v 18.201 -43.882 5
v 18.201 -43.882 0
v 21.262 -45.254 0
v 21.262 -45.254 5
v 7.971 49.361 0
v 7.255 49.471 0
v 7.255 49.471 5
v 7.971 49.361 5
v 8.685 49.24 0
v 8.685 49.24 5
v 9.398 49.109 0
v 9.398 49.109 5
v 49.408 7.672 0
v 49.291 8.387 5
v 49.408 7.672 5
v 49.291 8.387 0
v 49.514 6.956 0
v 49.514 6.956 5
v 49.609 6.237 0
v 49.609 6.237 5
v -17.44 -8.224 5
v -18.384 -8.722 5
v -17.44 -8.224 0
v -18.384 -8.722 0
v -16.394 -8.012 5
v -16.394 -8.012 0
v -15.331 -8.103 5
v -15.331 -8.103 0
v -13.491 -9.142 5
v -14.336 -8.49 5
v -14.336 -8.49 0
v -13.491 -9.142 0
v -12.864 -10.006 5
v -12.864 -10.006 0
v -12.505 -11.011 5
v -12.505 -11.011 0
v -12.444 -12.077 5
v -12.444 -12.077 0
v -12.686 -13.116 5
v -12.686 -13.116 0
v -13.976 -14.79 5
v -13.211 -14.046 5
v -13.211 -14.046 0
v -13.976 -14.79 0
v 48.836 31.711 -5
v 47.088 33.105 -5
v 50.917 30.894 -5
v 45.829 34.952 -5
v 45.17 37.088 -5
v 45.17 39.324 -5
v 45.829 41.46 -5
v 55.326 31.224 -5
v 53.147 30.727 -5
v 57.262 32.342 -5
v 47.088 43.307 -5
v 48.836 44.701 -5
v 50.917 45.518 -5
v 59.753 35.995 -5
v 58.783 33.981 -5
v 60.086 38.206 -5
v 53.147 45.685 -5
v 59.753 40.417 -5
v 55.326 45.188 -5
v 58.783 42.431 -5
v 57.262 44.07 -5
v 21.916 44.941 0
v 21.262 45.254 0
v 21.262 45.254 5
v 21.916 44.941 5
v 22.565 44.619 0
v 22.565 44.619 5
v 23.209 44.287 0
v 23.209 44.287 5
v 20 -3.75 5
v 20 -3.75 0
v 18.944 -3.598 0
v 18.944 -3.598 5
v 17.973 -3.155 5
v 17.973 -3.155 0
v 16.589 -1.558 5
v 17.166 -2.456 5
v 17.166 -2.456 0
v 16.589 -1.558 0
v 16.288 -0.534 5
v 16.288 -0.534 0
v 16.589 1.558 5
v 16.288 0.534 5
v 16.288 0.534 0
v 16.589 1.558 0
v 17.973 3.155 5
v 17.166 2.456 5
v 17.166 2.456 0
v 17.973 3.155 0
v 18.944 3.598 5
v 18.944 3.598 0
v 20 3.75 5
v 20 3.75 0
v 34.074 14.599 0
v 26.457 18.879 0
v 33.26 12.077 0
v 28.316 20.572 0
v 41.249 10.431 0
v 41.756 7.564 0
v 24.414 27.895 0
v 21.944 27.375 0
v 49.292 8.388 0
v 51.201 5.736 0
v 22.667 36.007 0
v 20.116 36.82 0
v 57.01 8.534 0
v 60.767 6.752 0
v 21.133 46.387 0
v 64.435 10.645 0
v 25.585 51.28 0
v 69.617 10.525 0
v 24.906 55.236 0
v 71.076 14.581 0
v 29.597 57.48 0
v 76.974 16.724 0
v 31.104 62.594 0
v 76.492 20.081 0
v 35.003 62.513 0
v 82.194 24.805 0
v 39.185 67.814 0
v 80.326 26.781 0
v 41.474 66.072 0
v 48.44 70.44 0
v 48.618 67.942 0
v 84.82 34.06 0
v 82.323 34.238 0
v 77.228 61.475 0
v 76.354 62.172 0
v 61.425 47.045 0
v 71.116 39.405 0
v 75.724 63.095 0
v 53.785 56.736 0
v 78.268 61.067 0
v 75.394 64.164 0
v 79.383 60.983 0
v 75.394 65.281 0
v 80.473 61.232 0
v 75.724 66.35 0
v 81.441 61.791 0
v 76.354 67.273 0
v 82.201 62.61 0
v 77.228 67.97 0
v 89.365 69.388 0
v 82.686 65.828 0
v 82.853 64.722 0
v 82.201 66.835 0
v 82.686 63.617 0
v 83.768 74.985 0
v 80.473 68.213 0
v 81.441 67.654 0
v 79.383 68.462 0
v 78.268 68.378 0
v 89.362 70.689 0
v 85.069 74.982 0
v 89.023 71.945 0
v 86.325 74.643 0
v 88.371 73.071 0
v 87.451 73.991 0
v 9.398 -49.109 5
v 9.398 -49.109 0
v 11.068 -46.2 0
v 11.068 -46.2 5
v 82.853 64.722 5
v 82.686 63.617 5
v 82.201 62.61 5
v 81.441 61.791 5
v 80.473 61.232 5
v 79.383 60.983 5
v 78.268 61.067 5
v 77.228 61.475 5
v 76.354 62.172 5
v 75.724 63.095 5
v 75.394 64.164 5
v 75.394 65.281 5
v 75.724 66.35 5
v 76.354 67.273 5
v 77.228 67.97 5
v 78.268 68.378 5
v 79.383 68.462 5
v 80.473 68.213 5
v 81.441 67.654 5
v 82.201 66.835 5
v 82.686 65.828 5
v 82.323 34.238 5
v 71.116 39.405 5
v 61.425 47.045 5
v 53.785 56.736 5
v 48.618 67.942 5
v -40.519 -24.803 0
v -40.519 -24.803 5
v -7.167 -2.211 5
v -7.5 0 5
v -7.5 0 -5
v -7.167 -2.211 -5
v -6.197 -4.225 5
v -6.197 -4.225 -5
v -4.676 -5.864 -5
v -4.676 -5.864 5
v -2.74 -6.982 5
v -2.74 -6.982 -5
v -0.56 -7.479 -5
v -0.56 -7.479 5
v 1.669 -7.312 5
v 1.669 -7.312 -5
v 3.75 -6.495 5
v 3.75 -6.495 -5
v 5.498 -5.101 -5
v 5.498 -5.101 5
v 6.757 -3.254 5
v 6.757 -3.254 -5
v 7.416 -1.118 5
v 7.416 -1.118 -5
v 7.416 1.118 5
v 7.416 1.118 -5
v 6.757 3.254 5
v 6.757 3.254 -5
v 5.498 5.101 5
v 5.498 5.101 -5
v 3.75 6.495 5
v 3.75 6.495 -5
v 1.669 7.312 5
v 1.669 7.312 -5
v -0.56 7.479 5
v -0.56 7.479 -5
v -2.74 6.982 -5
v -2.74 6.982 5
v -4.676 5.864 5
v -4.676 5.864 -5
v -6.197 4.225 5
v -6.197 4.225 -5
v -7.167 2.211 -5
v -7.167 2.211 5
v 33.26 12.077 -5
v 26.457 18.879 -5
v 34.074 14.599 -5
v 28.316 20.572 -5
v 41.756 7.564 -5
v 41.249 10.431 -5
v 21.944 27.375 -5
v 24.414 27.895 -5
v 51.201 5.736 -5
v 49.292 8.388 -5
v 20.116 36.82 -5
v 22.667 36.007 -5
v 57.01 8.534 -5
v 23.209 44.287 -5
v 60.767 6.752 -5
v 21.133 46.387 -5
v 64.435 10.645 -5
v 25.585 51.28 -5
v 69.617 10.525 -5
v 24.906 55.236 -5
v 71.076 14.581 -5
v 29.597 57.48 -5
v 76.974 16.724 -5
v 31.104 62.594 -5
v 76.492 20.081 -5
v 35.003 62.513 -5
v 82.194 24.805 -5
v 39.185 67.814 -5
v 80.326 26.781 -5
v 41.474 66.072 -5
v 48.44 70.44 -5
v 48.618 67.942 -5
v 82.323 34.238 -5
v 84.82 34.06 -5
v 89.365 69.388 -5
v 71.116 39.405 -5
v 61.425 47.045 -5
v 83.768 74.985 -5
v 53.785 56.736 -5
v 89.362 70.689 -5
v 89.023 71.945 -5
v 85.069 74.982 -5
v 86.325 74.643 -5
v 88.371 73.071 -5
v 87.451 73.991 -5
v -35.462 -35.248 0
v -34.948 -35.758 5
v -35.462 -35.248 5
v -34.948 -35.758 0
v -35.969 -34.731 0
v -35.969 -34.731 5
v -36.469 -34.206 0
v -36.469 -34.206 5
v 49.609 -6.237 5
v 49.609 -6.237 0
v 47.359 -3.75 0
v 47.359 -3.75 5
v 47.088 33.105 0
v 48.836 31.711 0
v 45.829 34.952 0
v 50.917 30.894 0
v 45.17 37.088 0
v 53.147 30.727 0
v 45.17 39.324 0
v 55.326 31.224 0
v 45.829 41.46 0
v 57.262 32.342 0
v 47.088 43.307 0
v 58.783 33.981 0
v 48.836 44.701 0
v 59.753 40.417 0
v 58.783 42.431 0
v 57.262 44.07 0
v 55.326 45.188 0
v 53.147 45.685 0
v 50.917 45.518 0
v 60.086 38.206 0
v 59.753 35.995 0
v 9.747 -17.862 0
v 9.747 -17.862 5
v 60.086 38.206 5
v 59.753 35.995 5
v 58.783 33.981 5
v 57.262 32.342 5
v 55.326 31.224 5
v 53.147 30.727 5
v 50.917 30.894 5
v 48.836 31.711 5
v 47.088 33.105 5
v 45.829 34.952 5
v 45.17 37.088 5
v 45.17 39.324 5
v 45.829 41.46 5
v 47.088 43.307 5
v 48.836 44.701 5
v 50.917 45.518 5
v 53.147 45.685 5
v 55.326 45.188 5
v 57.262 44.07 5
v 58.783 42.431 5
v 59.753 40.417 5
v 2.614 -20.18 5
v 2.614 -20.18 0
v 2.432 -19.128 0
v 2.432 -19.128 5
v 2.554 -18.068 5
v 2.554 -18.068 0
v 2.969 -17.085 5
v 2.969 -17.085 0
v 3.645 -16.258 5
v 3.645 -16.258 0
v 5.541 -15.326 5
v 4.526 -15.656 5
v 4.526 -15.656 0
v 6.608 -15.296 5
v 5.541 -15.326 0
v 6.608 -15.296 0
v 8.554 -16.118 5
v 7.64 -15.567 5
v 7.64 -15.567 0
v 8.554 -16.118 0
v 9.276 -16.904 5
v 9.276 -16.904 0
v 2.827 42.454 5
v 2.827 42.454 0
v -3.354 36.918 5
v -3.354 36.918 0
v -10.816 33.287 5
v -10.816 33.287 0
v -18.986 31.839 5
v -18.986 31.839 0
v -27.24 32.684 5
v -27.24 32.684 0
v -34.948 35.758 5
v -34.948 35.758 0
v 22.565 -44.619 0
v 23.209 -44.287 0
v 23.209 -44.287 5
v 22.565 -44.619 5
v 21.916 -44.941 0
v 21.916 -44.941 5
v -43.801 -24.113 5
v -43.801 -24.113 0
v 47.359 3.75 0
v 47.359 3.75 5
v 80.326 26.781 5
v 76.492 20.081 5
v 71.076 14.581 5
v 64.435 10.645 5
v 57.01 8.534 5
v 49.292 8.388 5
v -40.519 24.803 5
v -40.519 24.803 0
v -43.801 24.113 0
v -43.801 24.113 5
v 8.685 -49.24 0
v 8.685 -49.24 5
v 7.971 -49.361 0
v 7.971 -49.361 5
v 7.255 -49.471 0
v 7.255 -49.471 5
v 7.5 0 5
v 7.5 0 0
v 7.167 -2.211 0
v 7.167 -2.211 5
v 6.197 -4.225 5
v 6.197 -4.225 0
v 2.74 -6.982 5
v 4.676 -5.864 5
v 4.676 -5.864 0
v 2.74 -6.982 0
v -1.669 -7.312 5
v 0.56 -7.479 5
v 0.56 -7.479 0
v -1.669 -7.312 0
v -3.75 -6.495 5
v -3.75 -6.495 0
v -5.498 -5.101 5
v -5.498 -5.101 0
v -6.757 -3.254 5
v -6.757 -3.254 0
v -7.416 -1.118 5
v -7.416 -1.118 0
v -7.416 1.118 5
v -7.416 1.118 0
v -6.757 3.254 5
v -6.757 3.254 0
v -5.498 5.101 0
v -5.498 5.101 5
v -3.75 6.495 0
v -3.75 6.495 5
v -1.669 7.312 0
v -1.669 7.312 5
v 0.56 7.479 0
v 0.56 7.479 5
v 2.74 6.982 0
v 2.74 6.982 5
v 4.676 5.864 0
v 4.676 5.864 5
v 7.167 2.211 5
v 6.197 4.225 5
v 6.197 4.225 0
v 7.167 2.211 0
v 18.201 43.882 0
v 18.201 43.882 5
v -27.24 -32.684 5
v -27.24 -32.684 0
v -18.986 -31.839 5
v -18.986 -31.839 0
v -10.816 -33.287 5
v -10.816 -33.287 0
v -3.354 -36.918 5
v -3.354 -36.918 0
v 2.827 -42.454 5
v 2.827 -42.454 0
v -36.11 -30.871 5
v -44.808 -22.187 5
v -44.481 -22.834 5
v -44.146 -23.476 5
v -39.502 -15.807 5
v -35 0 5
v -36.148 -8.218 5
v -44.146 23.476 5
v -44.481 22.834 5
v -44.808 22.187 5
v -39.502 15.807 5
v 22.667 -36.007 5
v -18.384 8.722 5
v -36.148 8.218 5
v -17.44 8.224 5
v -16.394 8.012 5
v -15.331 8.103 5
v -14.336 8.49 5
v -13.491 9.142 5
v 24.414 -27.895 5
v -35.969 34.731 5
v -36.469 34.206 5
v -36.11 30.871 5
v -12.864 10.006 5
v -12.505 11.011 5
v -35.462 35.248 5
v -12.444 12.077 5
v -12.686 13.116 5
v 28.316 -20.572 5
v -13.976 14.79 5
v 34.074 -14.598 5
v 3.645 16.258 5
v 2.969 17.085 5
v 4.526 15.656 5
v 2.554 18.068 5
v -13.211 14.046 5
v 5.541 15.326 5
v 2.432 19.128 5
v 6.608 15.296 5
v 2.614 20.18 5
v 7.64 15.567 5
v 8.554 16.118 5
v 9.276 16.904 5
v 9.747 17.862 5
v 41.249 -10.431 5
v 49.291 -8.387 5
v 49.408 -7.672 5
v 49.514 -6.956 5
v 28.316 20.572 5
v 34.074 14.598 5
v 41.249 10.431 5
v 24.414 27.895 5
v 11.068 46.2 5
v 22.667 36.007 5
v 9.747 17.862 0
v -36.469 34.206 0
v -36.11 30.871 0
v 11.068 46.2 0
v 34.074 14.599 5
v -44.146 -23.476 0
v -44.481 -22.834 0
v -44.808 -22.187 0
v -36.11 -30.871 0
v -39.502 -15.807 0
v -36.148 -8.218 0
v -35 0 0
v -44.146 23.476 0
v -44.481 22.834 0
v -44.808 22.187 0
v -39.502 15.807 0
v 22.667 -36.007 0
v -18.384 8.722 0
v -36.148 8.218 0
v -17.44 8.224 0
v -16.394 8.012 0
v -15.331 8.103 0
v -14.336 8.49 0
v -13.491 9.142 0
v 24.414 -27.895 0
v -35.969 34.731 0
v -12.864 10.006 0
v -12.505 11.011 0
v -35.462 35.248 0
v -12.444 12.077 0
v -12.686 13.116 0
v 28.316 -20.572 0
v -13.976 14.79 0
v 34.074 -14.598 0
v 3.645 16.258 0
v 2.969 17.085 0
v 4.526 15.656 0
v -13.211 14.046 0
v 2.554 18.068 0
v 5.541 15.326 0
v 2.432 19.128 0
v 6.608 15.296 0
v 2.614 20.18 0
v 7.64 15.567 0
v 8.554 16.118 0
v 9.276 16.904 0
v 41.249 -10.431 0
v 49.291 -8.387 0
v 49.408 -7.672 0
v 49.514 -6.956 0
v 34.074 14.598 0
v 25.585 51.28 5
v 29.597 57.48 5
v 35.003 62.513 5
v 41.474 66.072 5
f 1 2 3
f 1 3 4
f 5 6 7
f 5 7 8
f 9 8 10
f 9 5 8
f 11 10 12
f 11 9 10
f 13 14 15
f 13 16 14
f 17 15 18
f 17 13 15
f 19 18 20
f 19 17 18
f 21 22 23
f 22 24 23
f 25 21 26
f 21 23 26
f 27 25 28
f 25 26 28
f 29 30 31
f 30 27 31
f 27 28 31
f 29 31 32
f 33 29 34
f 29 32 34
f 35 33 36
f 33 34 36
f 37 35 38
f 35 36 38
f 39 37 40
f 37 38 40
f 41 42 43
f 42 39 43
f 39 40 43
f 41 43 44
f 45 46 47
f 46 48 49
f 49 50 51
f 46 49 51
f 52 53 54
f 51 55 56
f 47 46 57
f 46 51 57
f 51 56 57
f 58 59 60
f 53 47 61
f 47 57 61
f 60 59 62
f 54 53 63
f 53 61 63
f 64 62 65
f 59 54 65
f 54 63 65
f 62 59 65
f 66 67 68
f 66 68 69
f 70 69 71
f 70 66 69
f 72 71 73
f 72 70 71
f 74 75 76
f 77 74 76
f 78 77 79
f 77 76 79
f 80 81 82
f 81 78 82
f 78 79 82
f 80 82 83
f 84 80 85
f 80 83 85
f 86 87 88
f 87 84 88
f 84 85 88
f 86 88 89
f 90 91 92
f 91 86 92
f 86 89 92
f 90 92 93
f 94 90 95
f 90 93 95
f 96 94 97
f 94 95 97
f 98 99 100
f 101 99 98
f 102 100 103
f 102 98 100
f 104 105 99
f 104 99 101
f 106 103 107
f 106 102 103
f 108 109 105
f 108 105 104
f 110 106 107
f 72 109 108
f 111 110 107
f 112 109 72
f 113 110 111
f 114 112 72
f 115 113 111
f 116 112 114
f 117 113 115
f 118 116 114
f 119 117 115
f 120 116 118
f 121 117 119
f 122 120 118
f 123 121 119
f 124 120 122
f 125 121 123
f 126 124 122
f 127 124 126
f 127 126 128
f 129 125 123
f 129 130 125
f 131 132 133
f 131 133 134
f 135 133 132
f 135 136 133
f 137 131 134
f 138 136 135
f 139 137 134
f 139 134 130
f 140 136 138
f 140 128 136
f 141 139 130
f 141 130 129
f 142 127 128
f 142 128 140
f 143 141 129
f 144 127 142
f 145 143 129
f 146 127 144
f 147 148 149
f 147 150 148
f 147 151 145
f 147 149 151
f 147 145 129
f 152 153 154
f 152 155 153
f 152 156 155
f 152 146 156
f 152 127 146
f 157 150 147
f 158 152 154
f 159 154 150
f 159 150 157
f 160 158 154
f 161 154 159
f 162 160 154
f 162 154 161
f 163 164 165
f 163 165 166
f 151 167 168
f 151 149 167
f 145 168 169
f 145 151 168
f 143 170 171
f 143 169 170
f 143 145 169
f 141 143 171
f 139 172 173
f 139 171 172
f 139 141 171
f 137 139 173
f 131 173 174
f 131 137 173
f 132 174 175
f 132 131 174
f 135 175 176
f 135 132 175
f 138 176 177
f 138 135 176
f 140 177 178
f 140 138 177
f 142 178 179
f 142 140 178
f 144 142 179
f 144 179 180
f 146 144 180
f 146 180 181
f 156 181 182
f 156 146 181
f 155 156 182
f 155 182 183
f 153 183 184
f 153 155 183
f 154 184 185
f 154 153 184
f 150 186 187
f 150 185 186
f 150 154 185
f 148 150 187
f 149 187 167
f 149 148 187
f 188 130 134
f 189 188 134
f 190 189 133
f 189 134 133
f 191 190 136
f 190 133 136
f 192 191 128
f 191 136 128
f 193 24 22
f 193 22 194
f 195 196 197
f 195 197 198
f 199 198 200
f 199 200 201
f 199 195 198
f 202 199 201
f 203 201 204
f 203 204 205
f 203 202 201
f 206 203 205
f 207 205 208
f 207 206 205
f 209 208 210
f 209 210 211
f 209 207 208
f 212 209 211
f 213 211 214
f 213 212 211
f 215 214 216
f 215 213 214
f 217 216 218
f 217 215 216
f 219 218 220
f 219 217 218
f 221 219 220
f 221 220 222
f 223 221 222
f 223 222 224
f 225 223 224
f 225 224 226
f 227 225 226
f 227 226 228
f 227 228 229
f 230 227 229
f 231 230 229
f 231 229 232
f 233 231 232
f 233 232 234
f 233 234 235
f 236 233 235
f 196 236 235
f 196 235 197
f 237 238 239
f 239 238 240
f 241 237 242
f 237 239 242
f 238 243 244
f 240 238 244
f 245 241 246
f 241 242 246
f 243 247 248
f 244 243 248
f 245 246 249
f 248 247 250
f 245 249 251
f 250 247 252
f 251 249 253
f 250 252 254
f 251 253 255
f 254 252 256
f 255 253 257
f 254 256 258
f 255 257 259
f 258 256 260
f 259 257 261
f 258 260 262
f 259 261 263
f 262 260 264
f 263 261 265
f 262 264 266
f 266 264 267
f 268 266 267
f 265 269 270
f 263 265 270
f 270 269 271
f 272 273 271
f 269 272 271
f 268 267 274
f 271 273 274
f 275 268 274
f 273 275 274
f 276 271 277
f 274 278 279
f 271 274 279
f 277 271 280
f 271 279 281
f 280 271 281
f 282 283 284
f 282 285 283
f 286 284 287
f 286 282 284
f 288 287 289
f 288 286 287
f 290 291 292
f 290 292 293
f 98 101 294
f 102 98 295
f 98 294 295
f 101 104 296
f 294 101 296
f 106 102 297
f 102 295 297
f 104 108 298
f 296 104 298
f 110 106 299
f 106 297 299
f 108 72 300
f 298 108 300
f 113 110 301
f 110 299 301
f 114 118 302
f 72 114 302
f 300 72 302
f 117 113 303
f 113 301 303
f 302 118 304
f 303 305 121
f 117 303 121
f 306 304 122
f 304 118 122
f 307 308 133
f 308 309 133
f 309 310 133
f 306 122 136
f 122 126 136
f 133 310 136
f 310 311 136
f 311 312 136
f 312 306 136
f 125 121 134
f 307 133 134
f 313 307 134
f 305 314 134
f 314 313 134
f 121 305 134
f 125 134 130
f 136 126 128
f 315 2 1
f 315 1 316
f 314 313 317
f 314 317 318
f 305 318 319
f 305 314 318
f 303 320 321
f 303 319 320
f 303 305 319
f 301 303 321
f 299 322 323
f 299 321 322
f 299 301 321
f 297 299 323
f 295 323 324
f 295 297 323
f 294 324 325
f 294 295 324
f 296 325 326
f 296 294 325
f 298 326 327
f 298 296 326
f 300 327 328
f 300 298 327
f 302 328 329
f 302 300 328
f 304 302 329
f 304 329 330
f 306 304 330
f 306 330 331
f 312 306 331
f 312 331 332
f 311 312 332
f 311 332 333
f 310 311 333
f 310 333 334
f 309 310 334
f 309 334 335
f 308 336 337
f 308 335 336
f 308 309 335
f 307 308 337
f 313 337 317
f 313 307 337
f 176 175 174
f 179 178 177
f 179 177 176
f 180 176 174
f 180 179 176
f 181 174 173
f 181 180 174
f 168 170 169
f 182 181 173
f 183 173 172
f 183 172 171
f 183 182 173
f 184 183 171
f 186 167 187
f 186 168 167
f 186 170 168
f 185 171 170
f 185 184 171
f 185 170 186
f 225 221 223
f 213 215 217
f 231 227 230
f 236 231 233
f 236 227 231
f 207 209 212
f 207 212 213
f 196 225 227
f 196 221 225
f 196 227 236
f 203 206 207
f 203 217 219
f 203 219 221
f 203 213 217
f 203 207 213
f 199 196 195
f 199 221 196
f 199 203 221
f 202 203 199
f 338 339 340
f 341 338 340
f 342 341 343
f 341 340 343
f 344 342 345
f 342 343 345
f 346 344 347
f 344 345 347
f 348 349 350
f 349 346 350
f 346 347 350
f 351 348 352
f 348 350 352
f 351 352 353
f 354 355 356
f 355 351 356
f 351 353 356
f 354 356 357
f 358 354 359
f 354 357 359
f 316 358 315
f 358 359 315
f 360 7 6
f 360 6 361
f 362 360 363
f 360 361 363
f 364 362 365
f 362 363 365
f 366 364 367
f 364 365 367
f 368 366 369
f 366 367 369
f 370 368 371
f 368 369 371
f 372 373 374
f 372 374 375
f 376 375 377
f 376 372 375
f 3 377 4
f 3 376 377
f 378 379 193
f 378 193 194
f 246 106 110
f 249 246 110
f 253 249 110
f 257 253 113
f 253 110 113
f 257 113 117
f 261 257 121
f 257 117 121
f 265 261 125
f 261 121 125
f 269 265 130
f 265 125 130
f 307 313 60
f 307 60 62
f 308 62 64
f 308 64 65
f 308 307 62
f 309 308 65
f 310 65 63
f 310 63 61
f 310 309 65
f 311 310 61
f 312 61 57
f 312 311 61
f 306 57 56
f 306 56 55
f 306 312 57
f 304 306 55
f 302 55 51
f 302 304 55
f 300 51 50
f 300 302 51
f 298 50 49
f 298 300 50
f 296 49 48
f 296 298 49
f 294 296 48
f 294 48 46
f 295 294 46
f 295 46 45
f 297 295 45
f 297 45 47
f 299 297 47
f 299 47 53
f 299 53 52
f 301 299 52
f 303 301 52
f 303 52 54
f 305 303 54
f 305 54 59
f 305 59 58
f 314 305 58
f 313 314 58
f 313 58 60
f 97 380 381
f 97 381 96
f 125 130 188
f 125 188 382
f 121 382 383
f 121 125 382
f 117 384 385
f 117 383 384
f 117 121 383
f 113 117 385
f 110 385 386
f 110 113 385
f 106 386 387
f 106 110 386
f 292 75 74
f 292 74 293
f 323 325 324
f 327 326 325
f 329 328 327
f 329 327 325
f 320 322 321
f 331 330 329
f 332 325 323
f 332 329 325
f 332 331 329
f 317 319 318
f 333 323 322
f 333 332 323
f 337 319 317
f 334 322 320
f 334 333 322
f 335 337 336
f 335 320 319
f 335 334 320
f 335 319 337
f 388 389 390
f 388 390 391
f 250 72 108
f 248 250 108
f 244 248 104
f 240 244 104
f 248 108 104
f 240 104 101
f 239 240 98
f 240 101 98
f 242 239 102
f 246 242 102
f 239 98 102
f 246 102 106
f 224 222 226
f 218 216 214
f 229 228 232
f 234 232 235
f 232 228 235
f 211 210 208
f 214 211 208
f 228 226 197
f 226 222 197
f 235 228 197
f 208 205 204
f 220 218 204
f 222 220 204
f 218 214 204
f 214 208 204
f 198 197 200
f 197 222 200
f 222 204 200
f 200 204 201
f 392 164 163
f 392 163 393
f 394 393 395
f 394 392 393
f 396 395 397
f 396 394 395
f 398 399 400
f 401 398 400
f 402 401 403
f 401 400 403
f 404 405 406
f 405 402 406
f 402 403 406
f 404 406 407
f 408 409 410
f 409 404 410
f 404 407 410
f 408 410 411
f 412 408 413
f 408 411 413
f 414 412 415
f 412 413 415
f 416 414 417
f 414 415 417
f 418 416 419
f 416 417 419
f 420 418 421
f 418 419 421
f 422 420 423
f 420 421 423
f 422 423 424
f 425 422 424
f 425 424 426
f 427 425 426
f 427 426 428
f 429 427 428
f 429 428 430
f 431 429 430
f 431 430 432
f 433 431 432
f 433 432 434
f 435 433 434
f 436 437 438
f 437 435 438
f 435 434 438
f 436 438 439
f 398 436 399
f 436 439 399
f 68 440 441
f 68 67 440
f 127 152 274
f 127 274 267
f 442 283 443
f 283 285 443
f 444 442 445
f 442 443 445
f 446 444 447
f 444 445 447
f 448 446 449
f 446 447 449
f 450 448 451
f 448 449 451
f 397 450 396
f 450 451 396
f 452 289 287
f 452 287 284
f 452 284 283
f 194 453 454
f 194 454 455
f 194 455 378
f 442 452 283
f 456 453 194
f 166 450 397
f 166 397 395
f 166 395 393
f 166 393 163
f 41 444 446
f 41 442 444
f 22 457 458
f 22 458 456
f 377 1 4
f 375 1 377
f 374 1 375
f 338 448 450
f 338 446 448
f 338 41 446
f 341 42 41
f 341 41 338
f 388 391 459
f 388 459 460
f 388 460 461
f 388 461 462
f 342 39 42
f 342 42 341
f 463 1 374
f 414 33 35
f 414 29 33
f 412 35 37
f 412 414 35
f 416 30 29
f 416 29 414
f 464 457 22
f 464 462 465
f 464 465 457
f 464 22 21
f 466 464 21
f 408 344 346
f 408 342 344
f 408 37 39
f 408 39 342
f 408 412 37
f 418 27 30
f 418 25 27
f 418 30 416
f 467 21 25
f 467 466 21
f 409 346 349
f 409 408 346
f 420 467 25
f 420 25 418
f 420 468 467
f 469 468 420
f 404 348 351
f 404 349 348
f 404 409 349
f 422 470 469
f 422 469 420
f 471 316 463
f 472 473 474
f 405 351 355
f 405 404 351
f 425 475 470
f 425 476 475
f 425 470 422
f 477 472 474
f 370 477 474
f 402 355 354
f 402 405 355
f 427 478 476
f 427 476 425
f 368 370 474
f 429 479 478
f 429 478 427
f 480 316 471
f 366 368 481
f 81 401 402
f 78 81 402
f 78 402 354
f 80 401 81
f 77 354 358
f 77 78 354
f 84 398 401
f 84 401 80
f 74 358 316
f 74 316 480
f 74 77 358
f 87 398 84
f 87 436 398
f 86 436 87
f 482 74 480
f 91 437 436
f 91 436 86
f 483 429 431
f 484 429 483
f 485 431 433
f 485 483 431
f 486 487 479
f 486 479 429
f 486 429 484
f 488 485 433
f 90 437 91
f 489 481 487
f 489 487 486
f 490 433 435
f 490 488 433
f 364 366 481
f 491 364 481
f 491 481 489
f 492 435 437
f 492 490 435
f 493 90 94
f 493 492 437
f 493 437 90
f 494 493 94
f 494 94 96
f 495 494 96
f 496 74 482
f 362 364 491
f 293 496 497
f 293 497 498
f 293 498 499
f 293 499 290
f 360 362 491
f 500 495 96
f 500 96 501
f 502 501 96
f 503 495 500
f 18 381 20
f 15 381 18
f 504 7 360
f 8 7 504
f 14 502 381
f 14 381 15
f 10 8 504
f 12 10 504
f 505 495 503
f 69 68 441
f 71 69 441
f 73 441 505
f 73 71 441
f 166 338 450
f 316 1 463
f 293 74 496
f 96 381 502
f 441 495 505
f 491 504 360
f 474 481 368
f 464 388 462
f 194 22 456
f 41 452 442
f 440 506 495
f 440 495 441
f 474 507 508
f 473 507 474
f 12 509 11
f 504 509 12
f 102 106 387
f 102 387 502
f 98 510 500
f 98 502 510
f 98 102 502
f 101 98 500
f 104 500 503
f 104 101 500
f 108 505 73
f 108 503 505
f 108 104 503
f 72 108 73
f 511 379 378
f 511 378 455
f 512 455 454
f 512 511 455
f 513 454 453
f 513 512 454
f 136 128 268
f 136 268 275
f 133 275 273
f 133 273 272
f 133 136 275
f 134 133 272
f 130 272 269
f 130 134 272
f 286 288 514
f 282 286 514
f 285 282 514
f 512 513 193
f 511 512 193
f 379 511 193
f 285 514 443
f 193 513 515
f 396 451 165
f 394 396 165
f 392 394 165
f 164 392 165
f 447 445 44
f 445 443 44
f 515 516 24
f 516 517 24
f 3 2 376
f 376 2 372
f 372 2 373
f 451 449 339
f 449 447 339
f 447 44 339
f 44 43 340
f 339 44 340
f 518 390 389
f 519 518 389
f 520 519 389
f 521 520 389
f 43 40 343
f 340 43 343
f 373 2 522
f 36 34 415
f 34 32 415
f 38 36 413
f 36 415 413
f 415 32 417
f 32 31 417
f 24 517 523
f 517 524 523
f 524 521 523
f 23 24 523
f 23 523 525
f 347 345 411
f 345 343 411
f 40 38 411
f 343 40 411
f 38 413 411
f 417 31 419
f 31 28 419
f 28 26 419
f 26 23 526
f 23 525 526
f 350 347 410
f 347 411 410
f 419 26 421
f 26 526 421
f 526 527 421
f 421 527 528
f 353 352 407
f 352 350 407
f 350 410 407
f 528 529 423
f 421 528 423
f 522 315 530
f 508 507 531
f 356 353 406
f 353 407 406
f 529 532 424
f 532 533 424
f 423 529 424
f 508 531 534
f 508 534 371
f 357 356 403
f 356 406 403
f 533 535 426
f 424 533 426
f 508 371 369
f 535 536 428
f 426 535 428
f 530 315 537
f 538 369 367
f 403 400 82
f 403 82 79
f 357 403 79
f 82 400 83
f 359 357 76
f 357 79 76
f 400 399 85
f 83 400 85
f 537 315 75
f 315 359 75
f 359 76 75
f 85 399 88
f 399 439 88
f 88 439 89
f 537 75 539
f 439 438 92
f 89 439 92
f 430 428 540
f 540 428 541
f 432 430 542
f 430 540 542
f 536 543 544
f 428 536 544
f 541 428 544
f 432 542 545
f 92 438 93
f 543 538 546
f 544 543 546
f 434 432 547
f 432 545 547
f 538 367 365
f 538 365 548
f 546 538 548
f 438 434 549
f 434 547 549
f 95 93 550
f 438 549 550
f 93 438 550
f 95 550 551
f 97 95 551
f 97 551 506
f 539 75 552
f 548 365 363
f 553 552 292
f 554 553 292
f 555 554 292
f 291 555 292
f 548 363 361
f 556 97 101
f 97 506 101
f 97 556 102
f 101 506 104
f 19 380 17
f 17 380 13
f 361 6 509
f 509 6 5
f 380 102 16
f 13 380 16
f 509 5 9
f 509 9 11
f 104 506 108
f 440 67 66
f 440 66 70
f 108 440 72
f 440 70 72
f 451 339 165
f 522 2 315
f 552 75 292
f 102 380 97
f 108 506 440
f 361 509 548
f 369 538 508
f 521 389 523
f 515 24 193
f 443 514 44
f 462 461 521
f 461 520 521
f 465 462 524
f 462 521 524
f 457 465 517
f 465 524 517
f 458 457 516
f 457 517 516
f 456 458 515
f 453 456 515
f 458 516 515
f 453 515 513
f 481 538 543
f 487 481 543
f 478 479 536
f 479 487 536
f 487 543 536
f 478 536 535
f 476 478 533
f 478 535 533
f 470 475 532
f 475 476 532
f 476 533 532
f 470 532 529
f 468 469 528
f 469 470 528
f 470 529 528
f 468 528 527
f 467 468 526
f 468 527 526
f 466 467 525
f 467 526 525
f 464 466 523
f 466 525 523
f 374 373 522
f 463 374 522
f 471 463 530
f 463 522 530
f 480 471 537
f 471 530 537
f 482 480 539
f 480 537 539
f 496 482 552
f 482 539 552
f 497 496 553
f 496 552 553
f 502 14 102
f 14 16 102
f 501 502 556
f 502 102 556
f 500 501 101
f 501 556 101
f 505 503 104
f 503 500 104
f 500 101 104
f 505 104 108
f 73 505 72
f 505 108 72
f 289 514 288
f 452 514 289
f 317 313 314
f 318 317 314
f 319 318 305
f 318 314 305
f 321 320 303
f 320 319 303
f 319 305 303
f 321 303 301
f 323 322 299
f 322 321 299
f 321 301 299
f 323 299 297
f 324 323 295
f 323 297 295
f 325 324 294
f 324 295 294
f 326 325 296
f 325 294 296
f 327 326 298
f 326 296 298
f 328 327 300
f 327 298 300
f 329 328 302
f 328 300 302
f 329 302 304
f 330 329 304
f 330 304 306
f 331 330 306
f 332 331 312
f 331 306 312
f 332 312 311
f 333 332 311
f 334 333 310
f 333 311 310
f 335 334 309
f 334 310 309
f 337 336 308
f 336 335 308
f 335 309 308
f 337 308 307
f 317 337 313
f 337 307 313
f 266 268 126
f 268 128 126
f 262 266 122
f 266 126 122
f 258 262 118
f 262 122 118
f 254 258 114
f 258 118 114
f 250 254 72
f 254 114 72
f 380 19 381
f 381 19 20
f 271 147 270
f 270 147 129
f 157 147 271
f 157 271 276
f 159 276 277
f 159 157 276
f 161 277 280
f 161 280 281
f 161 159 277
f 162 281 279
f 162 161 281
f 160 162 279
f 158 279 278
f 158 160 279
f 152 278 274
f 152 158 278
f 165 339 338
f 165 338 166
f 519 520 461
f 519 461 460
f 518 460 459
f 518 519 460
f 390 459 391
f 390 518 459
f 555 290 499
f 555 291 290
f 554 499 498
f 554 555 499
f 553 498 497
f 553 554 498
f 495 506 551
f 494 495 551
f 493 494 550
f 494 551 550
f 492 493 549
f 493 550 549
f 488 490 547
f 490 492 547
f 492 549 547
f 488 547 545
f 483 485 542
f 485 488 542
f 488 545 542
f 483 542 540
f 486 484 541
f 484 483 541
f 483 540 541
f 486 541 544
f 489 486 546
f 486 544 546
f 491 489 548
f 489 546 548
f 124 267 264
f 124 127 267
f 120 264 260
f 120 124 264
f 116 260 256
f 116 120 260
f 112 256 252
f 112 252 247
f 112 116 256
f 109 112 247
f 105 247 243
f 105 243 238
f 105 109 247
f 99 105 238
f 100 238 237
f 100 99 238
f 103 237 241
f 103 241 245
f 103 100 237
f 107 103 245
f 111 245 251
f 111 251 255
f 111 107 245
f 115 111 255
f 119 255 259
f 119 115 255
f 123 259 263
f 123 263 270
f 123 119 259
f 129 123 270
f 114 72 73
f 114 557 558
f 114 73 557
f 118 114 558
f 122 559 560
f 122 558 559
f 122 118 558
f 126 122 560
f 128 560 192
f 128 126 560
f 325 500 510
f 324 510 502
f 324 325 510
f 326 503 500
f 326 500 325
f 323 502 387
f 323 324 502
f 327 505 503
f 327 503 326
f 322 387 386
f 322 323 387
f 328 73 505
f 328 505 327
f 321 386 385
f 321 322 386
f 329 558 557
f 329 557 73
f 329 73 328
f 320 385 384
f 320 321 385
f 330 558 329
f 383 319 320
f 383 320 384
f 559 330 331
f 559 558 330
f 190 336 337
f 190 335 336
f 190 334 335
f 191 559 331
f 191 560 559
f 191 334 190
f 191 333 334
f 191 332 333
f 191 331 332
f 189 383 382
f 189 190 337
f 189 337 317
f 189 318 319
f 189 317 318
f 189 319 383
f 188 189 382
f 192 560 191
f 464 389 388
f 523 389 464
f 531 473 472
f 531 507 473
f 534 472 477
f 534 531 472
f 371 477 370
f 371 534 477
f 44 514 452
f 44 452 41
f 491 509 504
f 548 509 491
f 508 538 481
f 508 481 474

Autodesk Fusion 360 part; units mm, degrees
sketch "Sketch1" plane through (0, 0, 0) normal (0, 0, 1) x (1, 0, 0) in component "Follower"
  circle A0 centre (0, 0) radius 7.5
  circle A1 centre (0, 0) radius 50
  line L0 (20, -3.75) -> (60, -3.75)
  arc A2 (60, -3.75) -> (60, 3.75) centre (60, 0) ccw
  line L1 (60, 3.75) -> (20, 3.75)
  arc A3 (20, 3.75) -> (20, -3.75) centre (20, 0) ccw
  line L2 (20, 0) -> (60, 0) construction
  line L3 (14.9746, 58.2222) -> (2.6139, 20.1799)
  arc A4 (2.6139, 20.1799) -> (9.7468, 17.8623) centre (6.1803, 19.0211) ccw
  line L4 (9.7468, 17.8623) -> (22.1075, 55.9046)
  arc A5 (22.1075, 55.9046) -> (14.9746, 58.2222) centre (18.541, 57.0634) ccw
  line L5 (-50.7452, 32.2333) -> (-18.3845, 8.7219)
  arc A6 (-18.3845, 8.7219) -> (-13.9761, 14.7895) centre (-16.1803, 11.7557) ccw
  line L6 (-13.9761, 14.7895) -> (-46.3368, 38.3009)
  arc A7 (-46.3368, 38.3009) -> (-50.7452, 32.2333) centre (-48.541, 35.2671) ccw
  line L7 (-46.3368, -38.3009) -> (-13.9761, -14.7895)
  arc A8 (-13.9761, -14.7895) -> (-18.3845, -8.7219) centre (-16.1803, -11.7557) ccw
  line L8 (-18.3845, -8.7219) -> (-50.7452, -32.2333)
  arc A9 (-50.7452, -32.2333) -> (-46.3368, -38.3009) centre (-48.541, -35.2671) ccw
  line L9 (22.1075, -55.9046) -> (9.7468, -17.8623)
  arc A10 (9.7468, -17.8623) -> (2.6139, -20.1799) centre (6.1803, -19.0211) ccw
  line L10 (2.6139, -20.1799) -> (14.9746, -58.2222)
  arc A11 (14.9746, -58.2222) -> (22.1075, -55.9046) centre (18.541, -57.0634) ccw
  circle A12 centre (52.5861, 38.206) radius 30
  line L11 (52.5861, 38.206) -> (20, 0) construction
  line L12 (52.5861, 38.206) -> (6.1803, 19.0211) construction
  circle A13 centre (-20.0861, 61.8187) radius 30
  circle A14 centre (-65, 0) radius 30
  circle A15 centre (-20.0861, -61.8187) radius 30
  circle A16 centre (52.5861, -38.206) radius 30
  dimension "d12" = 15
  dimension "d13" = 100
  dimension "d14" = 7.5
  dimension "d15" = 20
  dimension "d17" = 360
  dimension "d18" = 60
  dimension "d19" = 65
  dimension "d21" = 360
extrude "Extrude1" add sketch "Sketch1" along normal blind 5 contours A1 L0 L1 A3 L3 A4 L4 L5 A6 L6 L7 A8 L8 L9 A10 L10 A12 A13 A14 A15 A16 makes body 1 in component "Follower"
chamfer "Chamfer1" distance 2.5 angle 45 10 edges at (11.8409, -48.5777, 2.5) (18.9738, -46.2601, 2.5) (-38.1327, -32.3403, 2.5) (-42.5411, -26.2727, 2.5) (-42.5411, 26.2727, 2.5) (-38.1327, 32.3403, 2.5) (11.8409, 48.5777, 2.5) (18.9738, 46.2601, 2.5) (49.8592, -3.75, 2.5) (49.8592, 3.75, 2.5) on bodies 1 in component "Follower"
sketch "Sketch1 (2)" plane through (0, 0, 5) normal (0, 0, 1) x (-1, 0, 0) in component "FollowJoint"
  line L0 (-47.3592, -3.75) -> (-49.6094, -6.2375)
  arc A0 (-49.6094, -6.2375) -> (-49.2915, -8.3875) centre (0, 0) ccw
  arc A1 (-23.2089, -44.2871) -> (-49.2915, -8.3875) centre (-52.5861, -38.206) ccw
  arc A2 (-23.2089, -44.2871) -> (-21.2624, -45.2539) centre (0, 0) ccw
  line L1 (-21.2624, -45.2539) -> (-18.2013, -43.8824)
  line L2 (-18.2013, -43.8824) -> (-9.7468, -17.8623)
  arc A3 (-2.6139, -20.1799) -> (-9.7468, -17.8623) centre (-6.1803, -19.0211) ccw
  line L3 (-2.6139, -20.1799) -> (-11.0683, -46.2001)
  line L4 (-11.0683, -46.2001) -> (-9.3979, -49.1088)
  arc A4 (-9.3979, -49.1088) -> (-7.2549, -49.4709) centre (0, 0) ccw
  arc A5 (34.9476, -35.7584) -> (-7.2549, -49.4709) centre (20.0861, -61.8187) ccw
  arc A6 (34.9476, -35.7584) -> (36.4686, -34.2059) centre (0, 0) ccw
  line L5 (36.4686, -34.2059) -> (36.1102, -30.8708)
  line L6 (36.1102, -30.8708) -> (13.9761, -14.7895)
  arc A7 (18.3845, -8.7219) -> (13.9761, -14.7895) centre (16.1803, -11.7557) ccw
  line L7 (18.3845, -8.7219) -> (40.5186, -24.8032)
  line L8 (40.5186, -24.8032) -> (43.8012, -24.1134)
  arc A8 (43.8012, -24.1134) -> (44.8077, -22.1872) centre (0, 0) ccw
  arc A9 (44.8077, 22.1872) -> (44.8077, -22.1872) centre (65, 0) ccw
  arc A10 (44.8077, 22.1872) -> (43.8012, 24.1134) centre (0, 0) ccw
  line L9 (43.8012, 24.1134) -> (40.5186, 24.8032)
  line L10 (40.5186, 24.8032) -> (18.3845, 8.7219)
  arc A11 (13.9761, 14.7895) -> (18.3845, 8.7219) centre (16.1803, 11.7557) ccw
  line L11 (13.9761, 14.7895) -> (36.1102, 30.8708)
  line L12 (36.1102, 30.8708) -> (36.4686, 34.2059)
  arc A12 (36.4686, 34.2059) -> (34.9476, 35.7584) centre (0, 0) ccw
  arc A13 (-7.2549, 49.4709) -> (34.9476, 35.7584) centre (20.0861, 61.8187) ccw
  arc A14 (-7.2549, 49.4709) -> (-9.3979, 49.1088) centre (0, 0) ccw
  line L13 (-9.3979, 49.1088) -> (-11.0683, 46.2001)
  line L14 (-11.0683, 46.2001) -> (-2.6139, 20.1799)
  arc A15 (-9.7468, 17.8623) -> (-2.6139, 20.1799) centre (-6.1803, 19.0211) ccw
  line L15 (-9.7468, 17.8623) -> (-18.2013, 43.8824)
  line L16 (-18.2013, 43.8824) -> (-21.2624, 45.2539)
  arc A16 (-21.2624, 45.2539) -> (-23.2089, 44.2871) centre (0, 0) ccw
  arc A17 (-49.2915, 8.3875) -> (-23.2089, 44.2871) centre (-52.5861, 38.206) ccw
  arc A18 (-49.2915, 8.3875) -> (-49.6094, 6.2375) centre (0, 0) ccw
  line L17 (-49.6094, 6.2375) -> (-47.3592, 3.75)
  line L18 (-47.3592, 3.75) -> (-20, 3.75)
  arc A19 (-20, -3.75) -> (-20, 3.75) centre (-20, 0) ccw
  line L19 (-20, -3.75) -> (-47.3592, -3.75)
  circle A20 centre (0, 0) radius 7.5
  circle A21 centre (0, 0) radius 7.5
extrude "Extrude1'" add sketch "Sketch1 (2)" against normal blind 10 separate body contours A20 A21 makes body 2 in component "FollowJoint"
sketch "Sketch1 (3)" plane through (0, 0, 0) normal (0, 0, 1) x (1, 0, 0)
sketch "Sketch1 (4)" plane through (0, 0, 0) normal (0, 0, 1) x (1, 0, 0) in component "Cam"
  circle A0 centre (52.5861, 38.206) radius 7.5
  arc A1 (23.2089, 44.2871) -> (49.2915, 8.3875) centre (52.5861, 38.206) ccw
  line L0 (52.5861, 38.206) -> (158.6521, 144.2721) construction
  line L1 (52.5861, 38.206) -> (202.5861, 38.206) construction
  circle A2 centre (79.1026, 64.7225) radius 3.75
  arc A3 (89.365, 69.3879) -> (83.768, 74.985) centre (84.4059, 70.0258) ccw
  line L2 (83.768, 74.985) -> (48.4396, 70.4404)
  line L3 (89.365, 69.3879) -> (84.8205, 34.0595)
  arc A4 (48.6183, 67.9425) -> (82.3226, 34.2382) centre (98.548, 84.168) ccw
  arc A5 (48.6183, 67.9425) -> (82.3226, 34.2382) centre (52.5861, 38.206) ccw
  arc A6 (48.4396, 70.4404) -> (85.0861, 38.206) centre (52.5861, 38.206) ccw
  dimension "d27" = 65
  dimension "d28" = 60
  dimension "d29" = 15
  dimension "d30" = 150
  dimension "d31" = 45
  dimension "d32" = 7.5
  dimension "d33" = 10
  dimension "d34" = 37.5
  dimension "d35" = 45
  dimension "d36" = 105
  dimension "d37" = 65
extrude "Extrude1''" add sketch "Sketch1 (4)" along normal blind 5 separate body contours A1 A4 A5 makes body 3 in component "Cam"
extrude "Extrude2" add sketch "Sketch1 (4)" against normal blind 5 contours A3 L2 L3 A6 bodies 3 in component "Cam"
extrude "Extrude3" add sketch "Sketch1 (4)" along normal mid plane 10 contours A2 bodies 3 in component "Cam"
extrude "Extrude1'''" add sketch "Sketch1 (4)" along normal mid plane 10 separate body contours A0 makes body 4 in component "CamJoint"
component "Follower" placed x (1, 0, 0) y (0, 1, 0) z (0, 0, 1) at (0, 0, 0)
component "FollowJoint" placed x (1, 0, 0) y (0, 1, 0) z (0, 0, 1) at (0, 0, 0)
component "Cam" placed x (1, 0, 0) y (0, 1, 0) z (0, 0, 1) at (0, 0, 0)
component "CamJoint" placed x (1, 0, 0) y (0, 1, 0) z (0, 0, 1) at (0, 0, 0)
